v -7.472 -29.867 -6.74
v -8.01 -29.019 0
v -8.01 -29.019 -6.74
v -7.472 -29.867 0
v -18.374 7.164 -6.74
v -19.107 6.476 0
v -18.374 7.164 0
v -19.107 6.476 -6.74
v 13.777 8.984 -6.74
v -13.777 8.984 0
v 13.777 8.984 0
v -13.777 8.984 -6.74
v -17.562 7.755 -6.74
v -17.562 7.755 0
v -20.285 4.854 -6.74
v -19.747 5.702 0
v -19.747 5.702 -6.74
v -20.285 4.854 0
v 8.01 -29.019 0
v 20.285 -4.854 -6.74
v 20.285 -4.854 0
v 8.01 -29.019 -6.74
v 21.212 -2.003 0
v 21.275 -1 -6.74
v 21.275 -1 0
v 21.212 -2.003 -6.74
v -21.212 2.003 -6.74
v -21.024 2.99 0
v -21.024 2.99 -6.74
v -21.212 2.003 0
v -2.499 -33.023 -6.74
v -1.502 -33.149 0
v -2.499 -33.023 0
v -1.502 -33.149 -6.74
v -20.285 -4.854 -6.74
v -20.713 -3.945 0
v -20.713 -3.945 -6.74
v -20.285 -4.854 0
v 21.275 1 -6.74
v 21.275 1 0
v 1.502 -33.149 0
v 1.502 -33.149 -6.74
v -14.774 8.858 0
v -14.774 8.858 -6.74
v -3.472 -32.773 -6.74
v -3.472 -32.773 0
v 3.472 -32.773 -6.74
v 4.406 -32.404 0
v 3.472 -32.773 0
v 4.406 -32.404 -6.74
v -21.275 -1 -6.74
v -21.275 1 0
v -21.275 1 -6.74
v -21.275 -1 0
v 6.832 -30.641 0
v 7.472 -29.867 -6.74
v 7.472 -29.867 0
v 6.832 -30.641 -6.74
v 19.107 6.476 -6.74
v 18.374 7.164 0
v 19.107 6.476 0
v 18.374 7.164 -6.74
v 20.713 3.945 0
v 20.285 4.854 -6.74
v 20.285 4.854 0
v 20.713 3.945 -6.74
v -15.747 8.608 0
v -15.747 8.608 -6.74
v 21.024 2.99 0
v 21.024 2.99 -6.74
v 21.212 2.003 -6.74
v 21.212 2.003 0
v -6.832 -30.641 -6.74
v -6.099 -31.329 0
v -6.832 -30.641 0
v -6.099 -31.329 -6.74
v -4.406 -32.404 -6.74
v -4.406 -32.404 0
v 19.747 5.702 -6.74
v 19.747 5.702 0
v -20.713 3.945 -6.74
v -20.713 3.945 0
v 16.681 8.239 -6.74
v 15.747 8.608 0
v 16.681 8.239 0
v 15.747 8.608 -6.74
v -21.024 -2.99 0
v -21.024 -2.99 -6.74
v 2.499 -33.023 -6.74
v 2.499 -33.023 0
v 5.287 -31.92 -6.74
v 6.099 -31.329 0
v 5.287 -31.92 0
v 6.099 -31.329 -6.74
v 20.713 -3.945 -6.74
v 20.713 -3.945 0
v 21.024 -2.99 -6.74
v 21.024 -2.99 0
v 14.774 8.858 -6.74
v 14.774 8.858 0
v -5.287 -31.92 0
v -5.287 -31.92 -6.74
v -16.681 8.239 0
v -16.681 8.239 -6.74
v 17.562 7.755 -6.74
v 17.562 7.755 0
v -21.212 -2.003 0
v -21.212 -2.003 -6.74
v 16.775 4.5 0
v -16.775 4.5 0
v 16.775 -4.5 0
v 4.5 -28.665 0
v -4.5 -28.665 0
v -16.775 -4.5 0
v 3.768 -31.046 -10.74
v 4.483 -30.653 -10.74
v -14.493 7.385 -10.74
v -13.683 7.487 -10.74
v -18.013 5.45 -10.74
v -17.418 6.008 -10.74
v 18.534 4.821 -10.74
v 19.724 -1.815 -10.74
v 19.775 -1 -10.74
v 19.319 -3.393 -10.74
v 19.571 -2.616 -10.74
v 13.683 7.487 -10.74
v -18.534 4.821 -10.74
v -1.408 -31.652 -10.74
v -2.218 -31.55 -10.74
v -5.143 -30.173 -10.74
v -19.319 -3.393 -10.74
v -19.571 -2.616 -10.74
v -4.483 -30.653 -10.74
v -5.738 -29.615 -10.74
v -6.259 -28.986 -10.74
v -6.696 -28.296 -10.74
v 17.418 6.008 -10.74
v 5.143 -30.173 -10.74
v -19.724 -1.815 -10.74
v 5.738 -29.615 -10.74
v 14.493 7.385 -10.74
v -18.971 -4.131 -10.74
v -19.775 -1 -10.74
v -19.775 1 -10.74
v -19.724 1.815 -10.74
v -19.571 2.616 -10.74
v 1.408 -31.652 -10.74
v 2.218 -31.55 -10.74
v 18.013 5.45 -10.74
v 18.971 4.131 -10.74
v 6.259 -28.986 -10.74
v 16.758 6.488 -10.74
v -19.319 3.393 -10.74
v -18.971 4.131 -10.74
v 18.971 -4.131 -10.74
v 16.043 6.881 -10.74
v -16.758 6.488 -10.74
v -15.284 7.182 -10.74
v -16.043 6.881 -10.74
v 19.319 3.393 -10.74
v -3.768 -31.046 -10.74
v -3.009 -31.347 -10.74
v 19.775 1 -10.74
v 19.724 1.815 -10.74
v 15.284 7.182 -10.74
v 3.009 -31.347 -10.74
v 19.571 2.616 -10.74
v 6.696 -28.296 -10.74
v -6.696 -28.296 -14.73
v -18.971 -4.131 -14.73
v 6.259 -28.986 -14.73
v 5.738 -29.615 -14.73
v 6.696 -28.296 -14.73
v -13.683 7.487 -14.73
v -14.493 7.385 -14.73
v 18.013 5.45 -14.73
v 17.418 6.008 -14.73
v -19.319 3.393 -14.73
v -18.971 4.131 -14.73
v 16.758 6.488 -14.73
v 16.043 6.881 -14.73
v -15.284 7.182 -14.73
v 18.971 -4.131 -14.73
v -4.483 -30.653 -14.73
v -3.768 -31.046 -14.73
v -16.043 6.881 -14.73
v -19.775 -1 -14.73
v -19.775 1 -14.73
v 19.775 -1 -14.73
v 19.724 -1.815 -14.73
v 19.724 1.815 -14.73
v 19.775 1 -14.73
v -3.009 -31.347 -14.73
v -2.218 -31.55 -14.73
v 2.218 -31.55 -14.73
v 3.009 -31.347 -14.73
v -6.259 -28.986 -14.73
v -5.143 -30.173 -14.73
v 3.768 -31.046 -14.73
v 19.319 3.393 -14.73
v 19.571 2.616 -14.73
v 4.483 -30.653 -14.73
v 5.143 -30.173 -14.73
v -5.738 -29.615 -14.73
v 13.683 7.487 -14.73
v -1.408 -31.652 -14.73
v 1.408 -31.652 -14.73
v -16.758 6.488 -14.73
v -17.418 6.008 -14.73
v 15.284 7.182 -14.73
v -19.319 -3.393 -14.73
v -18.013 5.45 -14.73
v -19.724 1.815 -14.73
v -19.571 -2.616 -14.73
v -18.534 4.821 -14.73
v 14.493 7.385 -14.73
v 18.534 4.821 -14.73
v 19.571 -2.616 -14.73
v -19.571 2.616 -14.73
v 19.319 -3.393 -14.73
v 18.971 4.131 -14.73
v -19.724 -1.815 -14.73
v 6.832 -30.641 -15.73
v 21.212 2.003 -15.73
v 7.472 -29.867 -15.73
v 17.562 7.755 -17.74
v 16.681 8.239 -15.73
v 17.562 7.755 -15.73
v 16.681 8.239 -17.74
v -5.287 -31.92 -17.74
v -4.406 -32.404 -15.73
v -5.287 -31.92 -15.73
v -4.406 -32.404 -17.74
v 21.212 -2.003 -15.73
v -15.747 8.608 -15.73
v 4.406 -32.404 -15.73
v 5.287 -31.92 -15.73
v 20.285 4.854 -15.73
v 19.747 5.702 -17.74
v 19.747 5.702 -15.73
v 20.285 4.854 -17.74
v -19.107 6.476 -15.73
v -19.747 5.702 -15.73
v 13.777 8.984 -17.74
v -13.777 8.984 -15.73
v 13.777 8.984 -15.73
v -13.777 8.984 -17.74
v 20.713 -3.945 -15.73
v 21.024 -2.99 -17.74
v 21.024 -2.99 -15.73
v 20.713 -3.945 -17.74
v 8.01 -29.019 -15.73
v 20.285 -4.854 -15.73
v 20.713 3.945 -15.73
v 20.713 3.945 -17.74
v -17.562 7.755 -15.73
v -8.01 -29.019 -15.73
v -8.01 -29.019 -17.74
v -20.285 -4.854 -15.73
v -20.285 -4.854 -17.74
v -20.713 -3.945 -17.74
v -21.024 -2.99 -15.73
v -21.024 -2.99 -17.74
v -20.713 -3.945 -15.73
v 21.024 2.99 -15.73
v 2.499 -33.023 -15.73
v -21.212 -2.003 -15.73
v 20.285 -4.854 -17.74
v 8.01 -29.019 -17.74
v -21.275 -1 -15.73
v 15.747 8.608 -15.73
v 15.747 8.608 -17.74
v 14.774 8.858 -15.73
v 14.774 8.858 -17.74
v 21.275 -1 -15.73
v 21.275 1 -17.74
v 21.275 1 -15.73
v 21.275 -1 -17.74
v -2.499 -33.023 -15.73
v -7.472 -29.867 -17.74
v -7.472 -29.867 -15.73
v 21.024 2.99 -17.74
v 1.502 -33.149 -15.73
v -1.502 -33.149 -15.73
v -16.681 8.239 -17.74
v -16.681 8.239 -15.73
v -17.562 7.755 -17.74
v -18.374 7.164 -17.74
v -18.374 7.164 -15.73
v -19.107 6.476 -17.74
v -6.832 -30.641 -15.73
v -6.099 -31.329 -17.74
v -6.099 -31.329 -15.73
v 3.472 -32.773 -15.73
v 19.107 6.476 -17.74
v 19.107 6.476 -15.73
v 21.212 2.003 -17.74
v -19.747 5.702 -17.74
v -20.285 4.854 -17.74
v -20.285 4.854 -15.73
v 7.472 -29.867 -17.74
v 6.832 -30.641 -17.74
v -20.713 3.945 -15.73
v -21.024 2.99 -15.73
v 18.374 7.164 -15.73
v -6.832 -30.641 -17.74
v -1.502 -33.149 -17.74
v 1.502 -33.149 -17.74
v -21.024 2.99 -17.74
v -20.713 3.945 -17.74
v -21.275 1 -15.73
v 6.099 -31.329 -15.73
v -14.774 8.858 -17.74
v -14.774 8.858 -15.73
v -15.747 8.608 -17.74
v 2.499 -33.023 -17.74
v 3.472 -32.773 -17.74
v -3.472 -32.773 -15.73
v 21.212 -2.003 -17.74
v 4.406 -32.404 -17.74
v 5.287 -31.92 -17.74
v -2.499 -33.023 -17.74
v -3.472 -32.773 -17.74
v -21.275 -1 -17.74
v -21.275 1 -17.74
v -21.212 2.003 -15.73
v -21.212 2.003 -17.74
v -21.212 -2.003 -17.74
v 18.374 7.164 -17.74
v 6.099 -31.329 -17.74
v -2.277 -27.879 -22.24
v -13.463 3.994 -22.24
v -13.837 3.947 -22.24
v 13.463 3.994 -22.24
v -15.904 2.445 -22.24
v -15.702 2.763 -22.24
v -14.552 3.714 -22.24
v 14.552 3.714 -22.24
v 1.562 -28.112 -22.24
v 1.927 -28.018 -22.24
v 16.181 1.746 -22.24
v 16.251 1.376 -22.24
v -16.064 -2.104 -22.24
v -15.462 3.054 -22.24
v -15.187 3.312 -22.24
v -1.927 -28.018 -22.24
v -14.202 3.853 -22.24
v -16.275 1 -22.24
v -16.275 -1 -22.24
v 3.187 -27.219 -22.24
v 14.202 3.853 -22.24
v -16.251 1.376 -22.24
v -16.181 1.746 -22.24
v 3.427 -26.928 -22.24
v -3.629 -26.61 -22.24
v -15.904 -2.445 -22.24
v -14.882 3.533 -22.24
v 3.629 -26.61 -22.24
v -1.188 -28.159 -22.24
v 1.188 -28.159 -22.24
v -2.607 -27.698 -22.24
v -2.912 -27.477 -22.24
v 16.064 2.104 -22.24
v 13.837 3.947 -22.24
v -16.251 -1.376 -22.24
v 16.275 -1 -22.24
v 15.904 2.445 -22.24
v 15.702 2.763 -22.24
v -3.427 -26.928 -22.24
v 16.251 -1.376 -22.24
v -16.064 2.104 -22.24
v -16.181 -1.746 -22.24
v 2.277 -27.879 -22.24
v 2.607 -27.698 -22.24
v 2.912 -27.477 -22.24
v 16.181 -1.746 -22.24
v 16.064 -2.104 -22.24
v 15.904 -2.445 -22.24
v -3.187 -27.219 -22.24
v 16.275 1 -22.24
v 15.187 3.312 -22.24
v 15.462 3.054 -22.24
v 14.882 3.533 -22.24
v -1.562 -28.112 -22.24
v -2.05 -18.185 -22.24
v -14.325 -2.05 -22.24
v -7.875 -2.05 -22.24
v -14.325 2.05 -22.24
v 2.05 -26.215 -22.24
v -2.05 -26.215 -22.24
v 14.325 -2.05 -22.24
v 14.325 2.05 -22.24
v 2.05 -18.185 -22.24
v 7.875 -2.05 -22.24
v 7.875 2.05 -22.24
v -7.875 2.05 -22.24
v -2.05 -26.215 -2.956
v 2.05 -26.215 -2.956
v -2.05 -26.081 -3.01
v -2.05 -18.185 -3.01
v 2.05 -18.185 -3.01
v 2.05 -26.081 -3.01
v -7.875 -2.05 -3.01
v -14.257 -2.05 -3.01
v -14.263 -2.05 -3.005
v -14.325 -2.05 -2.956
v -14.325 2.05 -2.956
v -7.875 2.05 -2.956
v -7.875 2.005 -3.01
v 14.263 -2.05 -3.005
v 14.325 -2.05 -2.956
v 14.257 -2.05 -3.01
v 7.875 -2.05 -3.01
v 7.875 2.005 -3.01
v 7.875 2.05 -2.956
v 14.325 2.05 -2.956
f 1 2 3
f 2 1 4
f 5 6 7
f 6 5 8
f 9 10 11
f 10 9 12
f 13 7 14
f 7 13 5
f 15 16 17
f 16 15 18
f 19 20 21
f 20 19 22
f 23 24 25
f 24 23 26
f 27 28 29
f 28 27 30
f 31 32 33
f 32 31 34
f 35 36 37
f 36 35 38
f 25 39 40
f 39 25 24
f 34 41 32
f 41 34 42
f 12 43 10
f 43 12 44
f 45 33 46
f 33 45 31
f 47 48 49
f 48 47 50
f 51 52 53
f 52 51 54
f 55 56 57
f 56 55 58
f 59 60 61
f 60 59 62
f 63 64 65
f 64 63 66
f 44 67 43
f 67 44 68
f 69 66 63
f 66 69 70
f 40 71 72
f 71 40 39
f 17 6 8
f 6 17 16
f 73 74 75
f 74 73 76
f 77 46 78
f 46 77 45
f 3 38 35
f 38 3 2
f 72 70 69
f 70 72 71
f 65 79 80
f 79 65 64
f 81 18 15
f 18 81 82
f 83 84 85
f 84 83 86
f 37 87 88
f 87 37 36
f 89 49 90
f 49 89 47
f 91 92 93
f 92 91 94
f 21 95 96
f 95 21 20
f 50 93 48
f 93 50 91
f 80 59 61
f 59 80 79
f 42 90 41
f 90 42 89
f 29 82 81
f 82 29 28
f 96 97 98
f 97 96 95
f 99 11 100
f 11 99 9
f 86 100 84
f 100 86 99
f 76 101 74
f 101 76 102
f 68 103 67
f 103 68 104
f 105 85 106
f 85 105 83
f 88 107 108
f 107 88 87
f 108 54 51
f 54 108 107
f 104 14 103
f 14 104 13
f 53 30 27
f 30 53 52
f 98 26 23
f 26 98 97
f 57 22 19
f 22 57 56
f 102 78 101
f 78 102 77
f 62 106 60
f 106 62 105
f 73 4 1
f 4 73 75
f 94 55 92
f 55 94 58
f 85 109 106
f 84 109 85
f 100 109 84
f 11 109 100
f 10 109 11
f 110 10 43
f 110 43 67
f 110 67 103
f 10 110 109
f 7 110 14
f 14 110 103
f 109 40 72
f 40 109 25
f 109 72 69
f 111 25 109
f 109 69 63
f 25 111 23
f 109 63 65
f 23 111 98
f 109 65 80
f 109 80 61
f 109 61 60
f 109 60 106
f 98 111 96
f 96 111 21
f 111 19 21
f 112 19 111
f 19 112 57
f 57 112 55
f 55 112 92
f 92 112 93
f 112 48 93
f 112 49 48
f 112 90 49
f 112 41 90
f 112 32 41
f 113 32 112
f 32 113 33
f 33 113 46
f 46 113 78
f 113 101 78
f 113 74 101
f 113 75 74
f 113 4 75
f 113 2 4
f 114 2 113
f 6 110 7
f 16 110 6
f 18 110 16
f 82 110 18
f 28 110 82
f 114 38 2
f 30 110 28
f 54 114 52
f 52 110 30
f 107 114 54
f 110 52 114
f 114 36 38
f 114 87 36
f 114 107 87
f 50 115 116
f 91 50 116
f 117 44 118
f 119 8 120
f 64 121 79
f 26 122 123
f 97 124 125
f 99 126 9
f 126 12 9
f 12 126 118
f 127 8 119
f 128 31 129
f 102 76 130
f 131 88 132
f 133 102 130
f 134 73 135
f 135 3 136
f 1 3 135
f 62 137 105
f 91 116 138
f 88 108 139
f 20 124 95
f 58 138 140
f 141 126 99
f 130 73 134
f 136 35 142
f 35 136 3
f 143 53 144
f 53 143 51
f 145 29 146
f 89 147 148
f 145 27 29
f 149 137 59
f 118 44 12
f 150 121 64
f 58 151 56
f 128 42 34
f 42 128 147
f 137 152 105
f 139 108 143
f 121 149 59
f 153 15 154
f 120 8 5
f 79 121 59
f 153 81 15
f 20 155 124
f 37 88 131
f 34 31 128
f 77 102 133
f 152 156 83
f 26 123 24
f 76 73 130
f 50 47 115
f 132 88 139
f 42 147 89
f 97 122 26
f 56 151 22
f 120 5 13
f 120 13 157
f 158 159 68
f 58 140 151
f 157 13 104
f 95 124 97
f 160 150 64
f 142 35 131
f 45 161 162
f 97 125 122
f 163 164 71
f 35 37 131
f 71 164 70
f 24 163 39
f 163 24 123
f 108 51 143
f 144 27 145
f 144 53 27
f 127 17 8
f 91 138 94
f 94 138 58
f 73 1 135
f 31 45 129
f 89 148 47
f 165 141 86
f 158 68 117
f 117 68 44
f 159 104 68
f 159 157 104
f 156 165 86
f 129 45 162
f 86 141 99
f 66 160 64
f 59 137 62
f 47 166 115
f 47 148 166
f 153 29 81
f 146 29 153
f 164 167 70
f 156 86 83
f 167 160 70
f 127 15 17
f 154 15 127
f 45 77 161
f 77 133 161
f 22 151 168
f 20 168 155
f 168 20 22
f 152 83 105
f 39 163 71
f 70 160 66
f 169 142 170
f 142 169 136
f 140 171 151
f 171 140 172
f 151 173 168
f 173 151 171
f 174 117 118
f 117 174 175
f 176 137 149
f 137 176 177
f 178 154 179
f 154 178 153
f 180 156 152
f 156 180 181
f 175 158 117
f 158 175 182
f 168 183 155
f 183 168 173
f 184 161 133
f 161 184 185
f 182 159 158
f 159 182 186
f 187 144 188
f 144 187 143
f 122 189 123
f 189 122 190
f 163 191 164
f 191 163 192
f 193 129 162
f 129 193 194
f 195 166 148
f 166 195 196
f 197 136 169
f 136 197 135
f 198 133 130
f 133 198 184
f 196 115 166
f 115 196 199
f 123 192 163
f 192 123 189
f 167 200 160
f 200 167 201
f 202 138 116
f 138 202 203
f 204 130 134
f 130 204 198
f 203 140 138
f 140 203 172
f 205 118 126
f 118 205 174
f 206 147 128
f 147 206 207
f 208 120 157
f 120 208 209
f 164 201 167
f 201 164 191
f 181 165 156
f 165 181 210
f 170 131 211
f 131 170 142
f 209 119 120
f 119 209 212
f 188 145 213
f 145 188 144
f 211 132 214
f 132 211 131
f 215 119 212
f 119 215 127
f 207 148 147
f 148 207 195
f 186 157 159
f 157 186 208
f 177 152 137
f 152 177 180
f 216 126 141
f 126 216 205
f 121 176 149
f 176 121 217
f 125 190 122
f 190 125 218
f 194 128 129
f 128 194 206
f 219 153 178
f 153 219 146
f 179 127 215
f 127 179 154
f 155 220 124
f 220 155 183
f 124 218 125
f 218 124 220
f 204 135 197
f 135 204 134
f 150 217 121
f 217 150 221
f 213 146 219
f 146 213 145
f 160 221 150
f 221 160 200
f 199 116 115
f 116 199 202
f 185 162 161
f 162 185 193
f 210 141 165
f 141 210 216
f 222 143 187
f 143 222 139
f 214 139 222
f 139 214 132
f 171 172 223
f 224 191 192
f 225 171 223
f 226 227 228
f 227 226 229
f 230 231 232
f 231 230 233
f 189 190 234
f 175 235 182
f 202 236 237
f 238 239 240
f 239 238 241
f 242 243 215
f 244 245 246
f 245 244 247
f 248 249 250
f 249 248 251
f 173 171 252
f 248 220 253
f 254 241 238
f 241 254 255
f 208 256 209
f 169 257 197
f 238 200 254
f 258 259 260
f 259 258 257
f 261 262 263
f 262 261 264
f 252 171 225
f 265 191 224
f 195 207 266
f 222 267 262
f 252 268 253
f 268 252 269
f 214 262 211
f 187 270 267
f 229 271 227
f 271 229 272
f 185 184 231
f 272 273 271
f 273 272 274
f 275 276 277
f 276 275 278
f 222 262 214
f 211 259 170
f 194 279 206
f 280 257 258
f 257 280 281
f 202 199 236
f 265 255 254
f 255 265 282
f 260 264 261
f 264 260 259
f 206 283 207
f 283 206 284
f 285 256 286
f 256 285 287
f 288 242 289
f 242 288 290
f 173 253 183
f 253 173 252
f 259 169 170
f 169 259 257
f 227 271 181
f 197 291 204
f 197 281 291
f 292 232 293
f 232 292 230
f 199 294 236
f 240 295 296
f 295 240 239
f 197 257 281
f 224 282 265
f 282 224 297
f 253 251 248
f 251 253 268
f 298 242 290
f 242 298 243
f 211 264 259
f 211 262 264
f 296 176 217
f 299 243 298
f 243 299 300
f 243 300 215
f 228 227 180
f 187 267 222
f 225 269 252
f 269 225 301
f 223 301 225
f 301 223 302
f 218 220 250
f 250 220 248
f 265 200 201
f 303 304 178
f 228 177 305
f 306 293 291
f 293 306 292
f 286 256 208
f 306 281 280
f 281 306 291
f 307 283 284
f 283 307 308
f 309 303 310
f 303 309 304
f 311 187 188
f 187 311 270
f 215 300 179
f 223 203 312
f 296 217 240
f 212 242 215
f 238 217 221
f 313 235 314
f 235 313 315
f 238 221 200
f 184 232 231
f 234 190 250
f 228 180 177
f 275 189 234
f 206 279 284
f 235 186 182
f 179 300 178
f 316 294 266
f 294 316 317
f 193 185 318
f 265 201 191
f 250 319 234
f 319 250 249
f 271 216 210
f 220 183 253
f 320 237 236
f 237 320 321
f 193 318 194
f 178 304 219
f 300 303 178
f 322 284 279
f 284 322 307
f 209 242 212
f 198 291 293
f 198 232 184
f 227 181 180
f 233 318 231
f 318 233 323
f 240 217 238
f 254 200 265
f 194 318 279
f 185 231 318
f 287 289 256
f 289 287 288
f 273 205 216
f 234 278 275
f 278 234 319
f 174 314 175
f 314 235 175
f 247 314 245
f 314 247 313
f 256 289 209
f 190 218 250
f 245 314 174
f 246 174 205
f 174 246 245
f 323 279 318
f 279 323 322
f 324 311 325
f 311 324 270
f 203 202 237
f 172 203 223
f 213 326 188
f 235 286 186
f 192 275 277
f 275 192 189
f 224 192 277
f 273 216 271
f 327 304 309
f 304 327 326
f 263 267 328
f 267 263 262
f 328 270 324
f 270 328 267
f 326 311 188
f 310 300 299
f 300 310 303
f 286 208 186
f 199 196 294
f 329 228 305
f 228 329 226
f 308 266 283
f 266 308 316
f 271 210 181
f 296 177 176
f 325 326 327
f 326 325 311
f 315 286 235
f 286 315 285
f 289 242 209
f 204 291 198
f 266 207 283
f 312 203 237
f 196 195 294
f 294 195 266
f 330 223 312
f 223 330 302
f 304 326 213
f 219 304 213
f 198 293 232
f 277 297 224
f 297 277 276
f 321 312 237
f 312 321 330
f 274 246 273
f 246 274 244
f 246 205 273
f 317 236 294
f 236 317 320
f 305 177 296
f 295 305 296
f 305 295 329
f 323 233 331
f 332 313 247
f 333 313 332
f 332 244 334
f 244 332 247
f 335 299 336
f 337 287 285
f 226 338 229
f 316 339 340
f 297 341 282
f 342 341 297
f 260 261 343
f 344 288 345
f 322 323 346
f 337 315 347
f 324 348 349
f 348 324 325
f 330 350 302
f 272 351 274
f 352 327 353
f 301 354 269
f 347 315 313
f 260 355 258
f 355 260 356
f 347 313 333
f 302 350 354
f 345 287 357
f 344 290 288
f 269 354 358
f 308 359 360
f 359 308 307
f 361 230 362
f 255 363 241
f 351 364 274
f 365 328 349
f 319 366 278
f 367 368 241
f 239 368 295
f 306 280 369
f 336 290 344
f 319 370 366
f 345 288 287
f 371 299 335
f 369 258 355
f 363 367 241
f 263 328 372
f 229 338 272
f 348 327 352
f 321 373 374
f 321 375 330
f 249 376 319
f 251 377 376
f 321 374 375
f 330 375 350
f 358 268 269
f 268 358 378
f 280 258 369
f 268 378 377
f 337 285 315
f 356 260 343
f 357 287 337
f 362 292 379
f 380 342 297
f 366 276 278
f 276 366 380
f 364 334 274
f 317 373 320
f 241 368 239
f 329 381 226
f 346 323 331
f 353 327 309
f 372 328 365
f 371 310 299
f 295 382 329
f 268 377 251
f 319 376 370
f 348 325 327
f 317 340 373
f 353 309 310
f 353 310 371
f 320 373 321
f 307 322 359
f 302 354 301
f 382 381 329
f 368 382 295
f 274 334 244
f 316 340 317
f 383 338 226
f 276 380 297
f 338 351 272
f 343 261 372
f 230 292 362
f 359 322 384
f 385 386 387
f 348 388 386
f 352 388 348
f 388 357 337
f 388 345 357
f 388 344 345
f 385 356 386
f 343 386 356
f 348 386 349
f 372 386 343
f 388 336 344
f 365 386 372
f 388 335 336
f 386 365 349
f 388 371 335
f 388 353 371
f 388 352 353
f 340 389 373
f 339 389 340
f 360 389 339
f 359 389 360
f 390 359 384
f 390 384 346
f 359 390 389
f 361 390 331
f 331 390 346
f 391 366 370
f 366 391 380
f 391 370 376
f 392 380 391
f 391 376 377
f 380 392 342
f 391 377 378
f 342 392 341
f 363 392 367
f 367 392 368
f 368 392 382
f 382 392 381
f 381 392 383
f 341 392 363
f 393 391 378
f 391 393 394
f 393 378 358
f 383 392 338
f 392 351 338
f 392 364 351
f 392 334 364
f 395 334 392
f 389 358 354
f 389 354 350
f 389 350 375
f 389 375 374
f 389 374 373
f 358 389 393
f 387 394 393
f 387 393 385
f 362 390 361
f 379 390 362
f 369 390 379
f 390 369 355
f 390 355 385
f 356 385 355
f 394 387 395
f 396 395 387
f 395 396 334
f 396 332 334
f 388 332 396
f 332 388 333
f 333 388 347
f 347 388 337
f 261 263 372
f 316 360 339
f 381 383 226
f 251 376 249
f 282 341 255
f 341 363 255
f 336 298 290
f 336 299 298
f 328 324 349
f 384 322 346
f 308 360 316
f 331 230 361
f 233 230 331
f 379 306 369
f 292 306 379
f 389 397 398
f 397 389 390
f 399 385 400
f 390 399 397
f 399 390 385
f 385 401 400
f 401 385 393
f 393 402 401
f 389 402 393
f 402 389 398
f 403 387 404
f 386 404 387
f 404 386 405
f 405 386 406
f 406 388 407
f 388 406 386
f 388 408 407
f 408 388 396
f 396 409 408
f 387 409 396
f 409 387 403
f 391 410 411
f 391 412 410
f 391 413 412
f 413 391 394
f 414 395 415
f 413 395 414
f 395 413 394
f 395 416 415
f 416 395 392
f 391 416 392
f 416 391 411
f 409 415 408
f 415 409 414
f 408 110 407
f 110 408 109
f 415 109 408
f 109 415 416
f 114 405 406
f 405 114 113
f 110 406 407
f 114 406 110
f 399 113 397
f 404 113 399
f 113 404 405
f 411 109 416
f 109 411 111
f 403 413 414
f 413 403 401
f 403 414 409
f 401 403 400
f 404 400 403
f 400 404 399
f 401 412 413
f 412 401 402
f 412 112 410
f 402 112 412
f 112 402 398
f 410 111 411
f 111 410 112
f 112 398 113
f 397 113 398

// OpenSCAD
VOFFS = 22.2;
HOFFS = 22.2 / 2;

PAIR_W = 6.35;
PAIR_H = 4;
PAIR_Z = 17.7;

SINGLE_W = 4;
SINGLE_H = 7.93;
SINGLE_Z = 22.73;


module cutout_base(expand=0) {
    for (xoffs = [-HOFFS, HOFFS])
    translate([xoffs, 0])
    square([
        PAIR_W + expand,
        PAIR_H + expand
    ], center=true)
        ;
    translate([0, VOFFS])
    square([
        SINGLE_W + expand,
        SINGLE_H + expand
    ], center=true)
        ;
}


module smoothed_plug(mink=2) {
    linear_extrude(0.01)
    minkowski() {
        hull()
        cutout_base(expand=-2)
            ;
        circle(r=2 + mink, $fn=50)
            ;
    }
        ;
}


module plug_segment(r0, r1, z0, z1) {
    hull() {
        translate([0, 0, z0])
        smoothed_plug(r0)
            ;
        translate([0, 0, z1])
        smoothed_plug(r1)
            ;
    }
        ;
}


rotate([180, 0, 0])
difference() {
    union() {
        plug_segment(6, 6, 0, SINGLE_Z - 16)
            ;
        plug_segment(6, 4.5, SINGLE_Z - 16, SINGLE_Z - 12)
            ;
        plug_segment(4.5, 4.5, SINGLE_Z - 12, SINGLE_Z - 8)
            ;
        plug_segment(4.5, 6, SINGLE_Z - 8, SINGLE_Z - 7)
            ;
        plug_segment(6, 6, SINGLE_Z - 7, SINGLE_Z - 5)
            ;
        plug_segment(6, 1, SINGLE_Z - 5, SINGLE_Z - 0.5)
            ;
    }
        ;
    linear_extrude(999, center=true)
    cutout_base(expand=0.1)
        ;
    hull() {
        translate([0, 0, -0.01])
        linear_extrude(0.01)
        cutout_base(expand=5)
            ;
        translate([0, 0, 3])
        linear_extrude(0.01)
        cutout_base(expand=0.01)
            ;
    }
}
